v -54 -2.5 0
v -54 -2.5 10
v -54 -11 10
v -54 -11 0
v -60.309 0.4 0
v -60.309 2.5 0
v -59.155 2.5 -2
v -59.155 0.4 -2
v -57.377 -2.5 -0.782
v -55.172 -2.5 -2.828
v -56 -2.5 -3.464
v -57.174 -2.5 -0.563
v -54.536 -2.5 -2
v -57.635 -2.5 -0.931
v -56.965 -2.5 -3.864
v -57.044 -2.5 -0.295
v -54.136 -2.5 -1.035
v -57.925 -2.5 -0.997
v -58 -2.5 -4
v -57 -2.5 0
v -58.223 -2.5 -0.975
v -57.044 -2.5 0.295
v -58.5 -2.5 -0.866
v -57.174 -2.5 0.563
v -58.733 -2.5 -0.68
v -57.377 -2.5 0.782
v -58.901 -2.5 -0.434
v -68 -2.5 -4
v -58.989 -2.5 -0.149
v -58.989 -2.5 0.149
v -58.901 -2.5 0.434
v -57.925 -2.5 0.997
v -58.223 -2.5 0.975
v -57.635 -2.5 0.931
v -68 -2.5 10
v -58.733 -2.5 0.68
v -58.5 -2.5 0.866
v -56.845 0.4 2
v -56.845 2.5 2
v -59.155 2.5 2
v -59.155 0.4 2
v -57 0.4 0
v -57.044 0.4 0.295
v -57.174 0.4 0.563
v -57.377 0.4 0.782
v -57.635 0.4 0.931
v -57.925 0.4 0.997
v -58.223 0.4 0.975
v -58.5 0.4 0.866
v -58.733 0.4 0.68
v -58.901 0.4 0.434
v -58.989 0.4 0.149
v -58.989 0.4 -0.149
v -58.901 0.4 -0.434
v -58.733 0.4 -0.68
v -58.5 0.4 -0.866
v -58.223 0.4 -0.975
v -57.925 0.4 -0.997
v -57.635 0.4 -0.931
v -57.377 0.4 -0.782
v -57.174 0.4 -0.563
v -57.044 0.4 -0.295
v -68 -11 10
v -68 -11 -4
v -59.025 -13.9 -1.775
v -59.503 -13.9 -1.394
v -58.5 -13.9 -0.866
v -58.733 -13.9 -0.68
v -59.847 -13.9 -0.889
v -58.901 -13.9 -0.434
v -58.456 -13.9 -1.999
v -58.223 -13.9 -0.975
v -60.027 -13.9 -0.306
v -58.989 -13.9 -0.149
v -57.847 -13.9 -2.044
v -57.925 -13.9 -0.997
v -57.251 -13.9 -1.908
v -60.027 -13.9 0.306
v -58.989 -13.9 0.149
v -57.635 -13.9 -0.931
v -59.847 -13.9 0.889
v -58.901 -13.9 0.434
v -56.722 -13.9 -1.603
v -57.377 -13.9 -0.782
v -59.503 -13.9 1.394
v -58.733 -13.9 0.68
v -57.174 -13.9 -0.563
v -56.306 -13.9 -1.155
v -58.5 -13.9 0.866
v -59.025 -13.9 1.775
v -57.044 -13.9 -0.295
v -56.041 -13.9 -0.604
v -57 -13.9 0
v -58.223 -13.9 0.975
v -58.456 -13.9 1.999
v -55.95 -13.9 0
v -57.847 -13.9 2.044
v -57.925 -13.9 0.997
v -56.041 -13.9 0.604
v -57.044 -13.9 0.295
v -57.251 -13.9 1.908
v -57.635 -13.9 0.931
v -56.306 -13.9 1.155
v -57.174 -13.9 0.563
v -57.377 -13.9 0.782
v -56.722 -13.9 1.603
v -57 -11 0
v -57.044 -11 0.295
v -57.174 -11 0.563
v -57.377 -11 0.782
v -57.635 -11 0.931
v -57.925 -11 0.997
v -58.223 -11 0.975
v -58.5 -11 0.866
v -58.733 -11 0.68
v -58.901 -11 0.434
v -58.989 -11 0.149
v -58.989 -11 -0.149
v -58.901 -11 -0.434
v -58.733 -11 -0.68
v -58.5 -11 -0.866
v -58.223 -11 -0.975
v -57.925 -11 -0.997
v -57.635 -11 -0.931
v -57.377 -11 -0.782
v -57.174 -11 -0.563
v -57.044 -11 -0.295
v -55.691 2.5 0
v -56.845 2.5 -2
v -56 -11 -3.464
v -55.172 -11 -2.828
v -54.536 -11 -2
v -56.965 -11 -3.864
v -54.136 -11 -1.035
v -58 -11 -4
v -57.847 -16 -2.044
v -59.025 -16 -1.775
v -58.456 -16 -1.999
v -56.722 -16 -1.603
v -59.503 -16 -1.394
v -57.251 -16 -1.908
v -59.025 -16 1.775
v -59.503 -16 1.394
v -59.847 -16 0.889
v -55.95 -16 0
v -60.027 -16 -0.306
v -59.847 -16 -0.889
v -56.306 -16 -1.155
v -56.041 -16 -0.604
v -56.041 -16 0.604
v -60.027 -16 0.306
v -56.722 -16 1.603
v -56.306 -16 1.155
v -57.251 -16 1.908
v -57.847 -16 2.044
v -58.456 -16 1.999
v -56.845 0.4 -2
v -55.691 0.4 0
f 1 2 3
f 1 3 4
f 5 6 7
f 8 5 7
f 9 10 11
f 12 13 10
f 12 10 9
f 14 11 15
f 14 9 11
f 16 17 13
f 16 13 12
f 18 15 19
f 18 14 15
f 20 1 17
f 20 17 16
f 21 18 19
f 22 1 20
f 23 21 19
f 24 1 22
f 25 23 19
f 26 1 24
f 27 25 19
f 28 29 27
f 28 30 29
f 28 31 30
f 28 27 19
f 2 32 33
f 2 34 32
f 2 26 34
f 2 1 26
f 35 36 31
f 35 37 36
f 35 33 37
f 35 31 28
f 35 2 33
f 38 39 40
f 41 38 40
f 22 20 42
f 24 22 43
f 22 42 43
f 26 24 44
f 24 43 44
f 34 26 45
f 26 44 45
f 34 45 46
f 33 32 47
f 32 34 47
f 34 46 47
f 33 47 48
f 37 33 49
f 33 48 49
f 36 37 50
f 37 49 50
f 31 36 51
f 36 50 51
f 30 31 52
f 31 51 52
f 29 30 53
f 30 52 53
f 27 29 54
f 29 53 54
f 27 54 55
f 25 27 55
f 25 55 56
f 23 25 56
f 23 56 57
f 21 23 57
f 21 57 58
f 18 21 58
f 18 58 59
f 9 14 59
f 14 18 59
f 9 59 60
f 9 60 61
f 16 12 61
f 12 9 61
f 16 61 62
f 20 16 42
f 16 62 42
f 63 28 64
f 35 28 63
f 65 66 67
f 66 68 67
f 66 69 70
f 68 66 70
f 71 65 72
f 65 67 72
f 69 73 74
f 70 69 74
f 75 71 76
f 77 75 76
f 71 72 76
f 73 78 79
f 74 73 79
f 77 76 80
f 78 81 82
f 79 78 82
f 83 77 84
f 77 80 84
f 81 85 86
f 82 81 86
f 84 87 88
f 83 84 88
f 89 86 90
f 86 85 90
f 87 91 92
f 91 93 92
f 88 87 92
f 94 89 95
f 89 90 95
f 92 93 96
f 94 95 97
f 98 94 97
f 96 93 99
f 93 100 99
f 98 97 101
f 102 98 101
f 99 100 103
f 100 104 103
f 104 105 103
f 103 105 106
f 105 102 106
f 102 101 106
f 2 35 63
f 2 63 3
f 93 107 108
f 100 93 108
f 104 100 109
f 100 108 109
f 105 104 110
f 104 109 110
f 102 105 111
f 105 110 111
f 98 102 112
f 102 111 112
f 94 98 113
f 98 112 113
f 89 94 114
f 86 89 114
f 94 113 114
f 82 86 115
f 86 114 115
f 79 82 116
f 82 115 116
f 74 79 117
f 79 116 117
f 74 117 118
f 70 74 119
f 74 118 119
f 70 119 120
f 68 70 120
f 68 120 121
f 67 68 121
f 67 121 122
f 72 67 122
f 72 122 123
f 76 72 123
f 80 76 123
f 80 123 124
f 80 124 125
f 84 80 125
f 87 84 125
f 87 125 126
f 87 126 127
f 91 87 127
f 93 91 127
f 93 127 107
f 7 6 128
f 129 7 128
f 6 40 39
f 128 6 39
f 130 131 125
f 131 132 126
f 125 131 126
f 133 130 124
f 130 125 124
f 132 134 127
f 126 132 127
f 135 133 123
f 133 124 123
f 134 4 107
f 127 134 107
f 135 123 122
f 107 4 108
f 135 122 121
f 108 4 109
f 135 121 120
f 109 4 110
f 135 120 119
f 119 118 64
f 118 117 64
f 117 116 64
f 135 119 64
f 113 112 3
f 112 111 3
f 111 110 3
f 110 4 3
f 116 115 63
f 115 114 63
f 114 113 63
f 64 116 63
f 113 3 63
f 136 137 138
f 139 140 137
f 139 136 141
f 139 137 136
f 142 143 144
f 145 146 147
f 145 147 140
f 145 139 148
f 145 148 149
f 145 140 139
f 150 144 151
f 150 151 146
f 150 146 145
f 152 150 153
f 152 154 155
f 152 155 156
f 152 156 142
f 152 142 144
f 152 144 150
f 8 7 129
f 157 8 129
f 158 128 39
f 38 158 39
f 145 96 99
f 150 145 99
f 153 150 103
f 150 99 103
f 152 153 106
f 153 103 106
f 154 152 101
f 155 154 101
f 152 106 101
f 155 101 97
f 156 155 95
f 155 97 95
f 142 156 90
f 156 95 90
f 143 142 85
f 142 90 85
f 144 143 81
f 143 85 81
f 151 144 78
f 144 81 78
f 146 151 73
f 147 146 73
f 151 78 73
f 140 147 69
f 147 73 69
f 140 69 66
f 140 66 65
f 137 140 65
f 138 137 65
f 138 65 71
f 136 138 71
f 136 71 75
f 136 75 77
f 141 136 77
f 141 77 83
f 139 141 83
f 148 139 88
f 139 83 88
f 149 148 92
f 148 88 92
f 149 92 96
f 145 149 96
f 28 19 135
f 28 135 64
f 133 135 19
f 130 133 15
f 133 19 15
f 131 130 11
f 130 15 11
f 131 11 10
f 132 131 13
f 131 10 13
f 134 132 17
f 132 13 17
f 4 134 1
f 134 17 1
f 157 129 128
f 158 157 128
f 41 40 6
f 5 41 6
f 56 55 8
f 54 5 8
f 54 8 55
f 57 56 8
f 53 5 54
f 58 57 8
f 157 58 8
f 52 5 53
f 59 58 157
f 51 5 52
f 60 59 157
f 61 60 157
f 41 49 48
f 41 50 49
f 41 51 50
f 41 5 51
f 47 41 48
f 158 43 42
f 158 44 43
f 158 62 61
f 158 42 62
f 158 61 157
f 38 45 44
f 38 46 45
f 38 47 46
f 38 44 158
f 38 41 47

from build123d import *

# Parameters (mm, degrees)
PAD002_DEPTH = 2.1
SKETCH003_R  = 1
PAD003_DEPTH = 14.3
SKETCH004_R  = 2.05
PAD004_DEPTH = 2.1
PAD005_DEPTH = 8.5


with BuildPart() as part:
    # Sketch002 → Pad002 (new body)
    with BuildSketch(Plane.XZ.offset(-2.5)):
        Polygon((-56.845299, -2), (-55.690599, 0), (-56.845299, 2), (-59.154701, 2), (-60.309401, 0), (-59.154701, -2), align=None)
    extrude(amount=PAD002_DEPTH)

    # Sketch003 (on Face8 of Pad002) → Pad003 (join)
    with BuildSketch(Plane.XZ.offset(-0.4)):
        with Locations((-58, 0)):
            Circle(SKETCH003_R)
    extrude(amount=PAD003_DEPTH)

    # Sketch004 (on Face10 of Pad003) → Pad004 (join)
    with BuildSketch(Plane.XZ.offset(13.9)):
        with Locations((-58, 0)):
            Circle(SKETCH004_R)
    extrude(amount=PAD004_DEPTH)

    # Sketch005 → Pad005 (join)
    with BuildSketch(Plane.XZ.offset(2.5)):
        with BuildLine():
            Line((-68, 10), (-54, 10))
            Line((-54, 10), (-54, 0))
            ThreePointArc((-58, -4), (-55.171573, -2.828427), (-54, 0))
            Line((-58, -4), (-68, -4))
            Line((-68, -4), (-68, 10))
        make_face()
    extrude(amount=PAD005_DEPTH)


solid = part.part
